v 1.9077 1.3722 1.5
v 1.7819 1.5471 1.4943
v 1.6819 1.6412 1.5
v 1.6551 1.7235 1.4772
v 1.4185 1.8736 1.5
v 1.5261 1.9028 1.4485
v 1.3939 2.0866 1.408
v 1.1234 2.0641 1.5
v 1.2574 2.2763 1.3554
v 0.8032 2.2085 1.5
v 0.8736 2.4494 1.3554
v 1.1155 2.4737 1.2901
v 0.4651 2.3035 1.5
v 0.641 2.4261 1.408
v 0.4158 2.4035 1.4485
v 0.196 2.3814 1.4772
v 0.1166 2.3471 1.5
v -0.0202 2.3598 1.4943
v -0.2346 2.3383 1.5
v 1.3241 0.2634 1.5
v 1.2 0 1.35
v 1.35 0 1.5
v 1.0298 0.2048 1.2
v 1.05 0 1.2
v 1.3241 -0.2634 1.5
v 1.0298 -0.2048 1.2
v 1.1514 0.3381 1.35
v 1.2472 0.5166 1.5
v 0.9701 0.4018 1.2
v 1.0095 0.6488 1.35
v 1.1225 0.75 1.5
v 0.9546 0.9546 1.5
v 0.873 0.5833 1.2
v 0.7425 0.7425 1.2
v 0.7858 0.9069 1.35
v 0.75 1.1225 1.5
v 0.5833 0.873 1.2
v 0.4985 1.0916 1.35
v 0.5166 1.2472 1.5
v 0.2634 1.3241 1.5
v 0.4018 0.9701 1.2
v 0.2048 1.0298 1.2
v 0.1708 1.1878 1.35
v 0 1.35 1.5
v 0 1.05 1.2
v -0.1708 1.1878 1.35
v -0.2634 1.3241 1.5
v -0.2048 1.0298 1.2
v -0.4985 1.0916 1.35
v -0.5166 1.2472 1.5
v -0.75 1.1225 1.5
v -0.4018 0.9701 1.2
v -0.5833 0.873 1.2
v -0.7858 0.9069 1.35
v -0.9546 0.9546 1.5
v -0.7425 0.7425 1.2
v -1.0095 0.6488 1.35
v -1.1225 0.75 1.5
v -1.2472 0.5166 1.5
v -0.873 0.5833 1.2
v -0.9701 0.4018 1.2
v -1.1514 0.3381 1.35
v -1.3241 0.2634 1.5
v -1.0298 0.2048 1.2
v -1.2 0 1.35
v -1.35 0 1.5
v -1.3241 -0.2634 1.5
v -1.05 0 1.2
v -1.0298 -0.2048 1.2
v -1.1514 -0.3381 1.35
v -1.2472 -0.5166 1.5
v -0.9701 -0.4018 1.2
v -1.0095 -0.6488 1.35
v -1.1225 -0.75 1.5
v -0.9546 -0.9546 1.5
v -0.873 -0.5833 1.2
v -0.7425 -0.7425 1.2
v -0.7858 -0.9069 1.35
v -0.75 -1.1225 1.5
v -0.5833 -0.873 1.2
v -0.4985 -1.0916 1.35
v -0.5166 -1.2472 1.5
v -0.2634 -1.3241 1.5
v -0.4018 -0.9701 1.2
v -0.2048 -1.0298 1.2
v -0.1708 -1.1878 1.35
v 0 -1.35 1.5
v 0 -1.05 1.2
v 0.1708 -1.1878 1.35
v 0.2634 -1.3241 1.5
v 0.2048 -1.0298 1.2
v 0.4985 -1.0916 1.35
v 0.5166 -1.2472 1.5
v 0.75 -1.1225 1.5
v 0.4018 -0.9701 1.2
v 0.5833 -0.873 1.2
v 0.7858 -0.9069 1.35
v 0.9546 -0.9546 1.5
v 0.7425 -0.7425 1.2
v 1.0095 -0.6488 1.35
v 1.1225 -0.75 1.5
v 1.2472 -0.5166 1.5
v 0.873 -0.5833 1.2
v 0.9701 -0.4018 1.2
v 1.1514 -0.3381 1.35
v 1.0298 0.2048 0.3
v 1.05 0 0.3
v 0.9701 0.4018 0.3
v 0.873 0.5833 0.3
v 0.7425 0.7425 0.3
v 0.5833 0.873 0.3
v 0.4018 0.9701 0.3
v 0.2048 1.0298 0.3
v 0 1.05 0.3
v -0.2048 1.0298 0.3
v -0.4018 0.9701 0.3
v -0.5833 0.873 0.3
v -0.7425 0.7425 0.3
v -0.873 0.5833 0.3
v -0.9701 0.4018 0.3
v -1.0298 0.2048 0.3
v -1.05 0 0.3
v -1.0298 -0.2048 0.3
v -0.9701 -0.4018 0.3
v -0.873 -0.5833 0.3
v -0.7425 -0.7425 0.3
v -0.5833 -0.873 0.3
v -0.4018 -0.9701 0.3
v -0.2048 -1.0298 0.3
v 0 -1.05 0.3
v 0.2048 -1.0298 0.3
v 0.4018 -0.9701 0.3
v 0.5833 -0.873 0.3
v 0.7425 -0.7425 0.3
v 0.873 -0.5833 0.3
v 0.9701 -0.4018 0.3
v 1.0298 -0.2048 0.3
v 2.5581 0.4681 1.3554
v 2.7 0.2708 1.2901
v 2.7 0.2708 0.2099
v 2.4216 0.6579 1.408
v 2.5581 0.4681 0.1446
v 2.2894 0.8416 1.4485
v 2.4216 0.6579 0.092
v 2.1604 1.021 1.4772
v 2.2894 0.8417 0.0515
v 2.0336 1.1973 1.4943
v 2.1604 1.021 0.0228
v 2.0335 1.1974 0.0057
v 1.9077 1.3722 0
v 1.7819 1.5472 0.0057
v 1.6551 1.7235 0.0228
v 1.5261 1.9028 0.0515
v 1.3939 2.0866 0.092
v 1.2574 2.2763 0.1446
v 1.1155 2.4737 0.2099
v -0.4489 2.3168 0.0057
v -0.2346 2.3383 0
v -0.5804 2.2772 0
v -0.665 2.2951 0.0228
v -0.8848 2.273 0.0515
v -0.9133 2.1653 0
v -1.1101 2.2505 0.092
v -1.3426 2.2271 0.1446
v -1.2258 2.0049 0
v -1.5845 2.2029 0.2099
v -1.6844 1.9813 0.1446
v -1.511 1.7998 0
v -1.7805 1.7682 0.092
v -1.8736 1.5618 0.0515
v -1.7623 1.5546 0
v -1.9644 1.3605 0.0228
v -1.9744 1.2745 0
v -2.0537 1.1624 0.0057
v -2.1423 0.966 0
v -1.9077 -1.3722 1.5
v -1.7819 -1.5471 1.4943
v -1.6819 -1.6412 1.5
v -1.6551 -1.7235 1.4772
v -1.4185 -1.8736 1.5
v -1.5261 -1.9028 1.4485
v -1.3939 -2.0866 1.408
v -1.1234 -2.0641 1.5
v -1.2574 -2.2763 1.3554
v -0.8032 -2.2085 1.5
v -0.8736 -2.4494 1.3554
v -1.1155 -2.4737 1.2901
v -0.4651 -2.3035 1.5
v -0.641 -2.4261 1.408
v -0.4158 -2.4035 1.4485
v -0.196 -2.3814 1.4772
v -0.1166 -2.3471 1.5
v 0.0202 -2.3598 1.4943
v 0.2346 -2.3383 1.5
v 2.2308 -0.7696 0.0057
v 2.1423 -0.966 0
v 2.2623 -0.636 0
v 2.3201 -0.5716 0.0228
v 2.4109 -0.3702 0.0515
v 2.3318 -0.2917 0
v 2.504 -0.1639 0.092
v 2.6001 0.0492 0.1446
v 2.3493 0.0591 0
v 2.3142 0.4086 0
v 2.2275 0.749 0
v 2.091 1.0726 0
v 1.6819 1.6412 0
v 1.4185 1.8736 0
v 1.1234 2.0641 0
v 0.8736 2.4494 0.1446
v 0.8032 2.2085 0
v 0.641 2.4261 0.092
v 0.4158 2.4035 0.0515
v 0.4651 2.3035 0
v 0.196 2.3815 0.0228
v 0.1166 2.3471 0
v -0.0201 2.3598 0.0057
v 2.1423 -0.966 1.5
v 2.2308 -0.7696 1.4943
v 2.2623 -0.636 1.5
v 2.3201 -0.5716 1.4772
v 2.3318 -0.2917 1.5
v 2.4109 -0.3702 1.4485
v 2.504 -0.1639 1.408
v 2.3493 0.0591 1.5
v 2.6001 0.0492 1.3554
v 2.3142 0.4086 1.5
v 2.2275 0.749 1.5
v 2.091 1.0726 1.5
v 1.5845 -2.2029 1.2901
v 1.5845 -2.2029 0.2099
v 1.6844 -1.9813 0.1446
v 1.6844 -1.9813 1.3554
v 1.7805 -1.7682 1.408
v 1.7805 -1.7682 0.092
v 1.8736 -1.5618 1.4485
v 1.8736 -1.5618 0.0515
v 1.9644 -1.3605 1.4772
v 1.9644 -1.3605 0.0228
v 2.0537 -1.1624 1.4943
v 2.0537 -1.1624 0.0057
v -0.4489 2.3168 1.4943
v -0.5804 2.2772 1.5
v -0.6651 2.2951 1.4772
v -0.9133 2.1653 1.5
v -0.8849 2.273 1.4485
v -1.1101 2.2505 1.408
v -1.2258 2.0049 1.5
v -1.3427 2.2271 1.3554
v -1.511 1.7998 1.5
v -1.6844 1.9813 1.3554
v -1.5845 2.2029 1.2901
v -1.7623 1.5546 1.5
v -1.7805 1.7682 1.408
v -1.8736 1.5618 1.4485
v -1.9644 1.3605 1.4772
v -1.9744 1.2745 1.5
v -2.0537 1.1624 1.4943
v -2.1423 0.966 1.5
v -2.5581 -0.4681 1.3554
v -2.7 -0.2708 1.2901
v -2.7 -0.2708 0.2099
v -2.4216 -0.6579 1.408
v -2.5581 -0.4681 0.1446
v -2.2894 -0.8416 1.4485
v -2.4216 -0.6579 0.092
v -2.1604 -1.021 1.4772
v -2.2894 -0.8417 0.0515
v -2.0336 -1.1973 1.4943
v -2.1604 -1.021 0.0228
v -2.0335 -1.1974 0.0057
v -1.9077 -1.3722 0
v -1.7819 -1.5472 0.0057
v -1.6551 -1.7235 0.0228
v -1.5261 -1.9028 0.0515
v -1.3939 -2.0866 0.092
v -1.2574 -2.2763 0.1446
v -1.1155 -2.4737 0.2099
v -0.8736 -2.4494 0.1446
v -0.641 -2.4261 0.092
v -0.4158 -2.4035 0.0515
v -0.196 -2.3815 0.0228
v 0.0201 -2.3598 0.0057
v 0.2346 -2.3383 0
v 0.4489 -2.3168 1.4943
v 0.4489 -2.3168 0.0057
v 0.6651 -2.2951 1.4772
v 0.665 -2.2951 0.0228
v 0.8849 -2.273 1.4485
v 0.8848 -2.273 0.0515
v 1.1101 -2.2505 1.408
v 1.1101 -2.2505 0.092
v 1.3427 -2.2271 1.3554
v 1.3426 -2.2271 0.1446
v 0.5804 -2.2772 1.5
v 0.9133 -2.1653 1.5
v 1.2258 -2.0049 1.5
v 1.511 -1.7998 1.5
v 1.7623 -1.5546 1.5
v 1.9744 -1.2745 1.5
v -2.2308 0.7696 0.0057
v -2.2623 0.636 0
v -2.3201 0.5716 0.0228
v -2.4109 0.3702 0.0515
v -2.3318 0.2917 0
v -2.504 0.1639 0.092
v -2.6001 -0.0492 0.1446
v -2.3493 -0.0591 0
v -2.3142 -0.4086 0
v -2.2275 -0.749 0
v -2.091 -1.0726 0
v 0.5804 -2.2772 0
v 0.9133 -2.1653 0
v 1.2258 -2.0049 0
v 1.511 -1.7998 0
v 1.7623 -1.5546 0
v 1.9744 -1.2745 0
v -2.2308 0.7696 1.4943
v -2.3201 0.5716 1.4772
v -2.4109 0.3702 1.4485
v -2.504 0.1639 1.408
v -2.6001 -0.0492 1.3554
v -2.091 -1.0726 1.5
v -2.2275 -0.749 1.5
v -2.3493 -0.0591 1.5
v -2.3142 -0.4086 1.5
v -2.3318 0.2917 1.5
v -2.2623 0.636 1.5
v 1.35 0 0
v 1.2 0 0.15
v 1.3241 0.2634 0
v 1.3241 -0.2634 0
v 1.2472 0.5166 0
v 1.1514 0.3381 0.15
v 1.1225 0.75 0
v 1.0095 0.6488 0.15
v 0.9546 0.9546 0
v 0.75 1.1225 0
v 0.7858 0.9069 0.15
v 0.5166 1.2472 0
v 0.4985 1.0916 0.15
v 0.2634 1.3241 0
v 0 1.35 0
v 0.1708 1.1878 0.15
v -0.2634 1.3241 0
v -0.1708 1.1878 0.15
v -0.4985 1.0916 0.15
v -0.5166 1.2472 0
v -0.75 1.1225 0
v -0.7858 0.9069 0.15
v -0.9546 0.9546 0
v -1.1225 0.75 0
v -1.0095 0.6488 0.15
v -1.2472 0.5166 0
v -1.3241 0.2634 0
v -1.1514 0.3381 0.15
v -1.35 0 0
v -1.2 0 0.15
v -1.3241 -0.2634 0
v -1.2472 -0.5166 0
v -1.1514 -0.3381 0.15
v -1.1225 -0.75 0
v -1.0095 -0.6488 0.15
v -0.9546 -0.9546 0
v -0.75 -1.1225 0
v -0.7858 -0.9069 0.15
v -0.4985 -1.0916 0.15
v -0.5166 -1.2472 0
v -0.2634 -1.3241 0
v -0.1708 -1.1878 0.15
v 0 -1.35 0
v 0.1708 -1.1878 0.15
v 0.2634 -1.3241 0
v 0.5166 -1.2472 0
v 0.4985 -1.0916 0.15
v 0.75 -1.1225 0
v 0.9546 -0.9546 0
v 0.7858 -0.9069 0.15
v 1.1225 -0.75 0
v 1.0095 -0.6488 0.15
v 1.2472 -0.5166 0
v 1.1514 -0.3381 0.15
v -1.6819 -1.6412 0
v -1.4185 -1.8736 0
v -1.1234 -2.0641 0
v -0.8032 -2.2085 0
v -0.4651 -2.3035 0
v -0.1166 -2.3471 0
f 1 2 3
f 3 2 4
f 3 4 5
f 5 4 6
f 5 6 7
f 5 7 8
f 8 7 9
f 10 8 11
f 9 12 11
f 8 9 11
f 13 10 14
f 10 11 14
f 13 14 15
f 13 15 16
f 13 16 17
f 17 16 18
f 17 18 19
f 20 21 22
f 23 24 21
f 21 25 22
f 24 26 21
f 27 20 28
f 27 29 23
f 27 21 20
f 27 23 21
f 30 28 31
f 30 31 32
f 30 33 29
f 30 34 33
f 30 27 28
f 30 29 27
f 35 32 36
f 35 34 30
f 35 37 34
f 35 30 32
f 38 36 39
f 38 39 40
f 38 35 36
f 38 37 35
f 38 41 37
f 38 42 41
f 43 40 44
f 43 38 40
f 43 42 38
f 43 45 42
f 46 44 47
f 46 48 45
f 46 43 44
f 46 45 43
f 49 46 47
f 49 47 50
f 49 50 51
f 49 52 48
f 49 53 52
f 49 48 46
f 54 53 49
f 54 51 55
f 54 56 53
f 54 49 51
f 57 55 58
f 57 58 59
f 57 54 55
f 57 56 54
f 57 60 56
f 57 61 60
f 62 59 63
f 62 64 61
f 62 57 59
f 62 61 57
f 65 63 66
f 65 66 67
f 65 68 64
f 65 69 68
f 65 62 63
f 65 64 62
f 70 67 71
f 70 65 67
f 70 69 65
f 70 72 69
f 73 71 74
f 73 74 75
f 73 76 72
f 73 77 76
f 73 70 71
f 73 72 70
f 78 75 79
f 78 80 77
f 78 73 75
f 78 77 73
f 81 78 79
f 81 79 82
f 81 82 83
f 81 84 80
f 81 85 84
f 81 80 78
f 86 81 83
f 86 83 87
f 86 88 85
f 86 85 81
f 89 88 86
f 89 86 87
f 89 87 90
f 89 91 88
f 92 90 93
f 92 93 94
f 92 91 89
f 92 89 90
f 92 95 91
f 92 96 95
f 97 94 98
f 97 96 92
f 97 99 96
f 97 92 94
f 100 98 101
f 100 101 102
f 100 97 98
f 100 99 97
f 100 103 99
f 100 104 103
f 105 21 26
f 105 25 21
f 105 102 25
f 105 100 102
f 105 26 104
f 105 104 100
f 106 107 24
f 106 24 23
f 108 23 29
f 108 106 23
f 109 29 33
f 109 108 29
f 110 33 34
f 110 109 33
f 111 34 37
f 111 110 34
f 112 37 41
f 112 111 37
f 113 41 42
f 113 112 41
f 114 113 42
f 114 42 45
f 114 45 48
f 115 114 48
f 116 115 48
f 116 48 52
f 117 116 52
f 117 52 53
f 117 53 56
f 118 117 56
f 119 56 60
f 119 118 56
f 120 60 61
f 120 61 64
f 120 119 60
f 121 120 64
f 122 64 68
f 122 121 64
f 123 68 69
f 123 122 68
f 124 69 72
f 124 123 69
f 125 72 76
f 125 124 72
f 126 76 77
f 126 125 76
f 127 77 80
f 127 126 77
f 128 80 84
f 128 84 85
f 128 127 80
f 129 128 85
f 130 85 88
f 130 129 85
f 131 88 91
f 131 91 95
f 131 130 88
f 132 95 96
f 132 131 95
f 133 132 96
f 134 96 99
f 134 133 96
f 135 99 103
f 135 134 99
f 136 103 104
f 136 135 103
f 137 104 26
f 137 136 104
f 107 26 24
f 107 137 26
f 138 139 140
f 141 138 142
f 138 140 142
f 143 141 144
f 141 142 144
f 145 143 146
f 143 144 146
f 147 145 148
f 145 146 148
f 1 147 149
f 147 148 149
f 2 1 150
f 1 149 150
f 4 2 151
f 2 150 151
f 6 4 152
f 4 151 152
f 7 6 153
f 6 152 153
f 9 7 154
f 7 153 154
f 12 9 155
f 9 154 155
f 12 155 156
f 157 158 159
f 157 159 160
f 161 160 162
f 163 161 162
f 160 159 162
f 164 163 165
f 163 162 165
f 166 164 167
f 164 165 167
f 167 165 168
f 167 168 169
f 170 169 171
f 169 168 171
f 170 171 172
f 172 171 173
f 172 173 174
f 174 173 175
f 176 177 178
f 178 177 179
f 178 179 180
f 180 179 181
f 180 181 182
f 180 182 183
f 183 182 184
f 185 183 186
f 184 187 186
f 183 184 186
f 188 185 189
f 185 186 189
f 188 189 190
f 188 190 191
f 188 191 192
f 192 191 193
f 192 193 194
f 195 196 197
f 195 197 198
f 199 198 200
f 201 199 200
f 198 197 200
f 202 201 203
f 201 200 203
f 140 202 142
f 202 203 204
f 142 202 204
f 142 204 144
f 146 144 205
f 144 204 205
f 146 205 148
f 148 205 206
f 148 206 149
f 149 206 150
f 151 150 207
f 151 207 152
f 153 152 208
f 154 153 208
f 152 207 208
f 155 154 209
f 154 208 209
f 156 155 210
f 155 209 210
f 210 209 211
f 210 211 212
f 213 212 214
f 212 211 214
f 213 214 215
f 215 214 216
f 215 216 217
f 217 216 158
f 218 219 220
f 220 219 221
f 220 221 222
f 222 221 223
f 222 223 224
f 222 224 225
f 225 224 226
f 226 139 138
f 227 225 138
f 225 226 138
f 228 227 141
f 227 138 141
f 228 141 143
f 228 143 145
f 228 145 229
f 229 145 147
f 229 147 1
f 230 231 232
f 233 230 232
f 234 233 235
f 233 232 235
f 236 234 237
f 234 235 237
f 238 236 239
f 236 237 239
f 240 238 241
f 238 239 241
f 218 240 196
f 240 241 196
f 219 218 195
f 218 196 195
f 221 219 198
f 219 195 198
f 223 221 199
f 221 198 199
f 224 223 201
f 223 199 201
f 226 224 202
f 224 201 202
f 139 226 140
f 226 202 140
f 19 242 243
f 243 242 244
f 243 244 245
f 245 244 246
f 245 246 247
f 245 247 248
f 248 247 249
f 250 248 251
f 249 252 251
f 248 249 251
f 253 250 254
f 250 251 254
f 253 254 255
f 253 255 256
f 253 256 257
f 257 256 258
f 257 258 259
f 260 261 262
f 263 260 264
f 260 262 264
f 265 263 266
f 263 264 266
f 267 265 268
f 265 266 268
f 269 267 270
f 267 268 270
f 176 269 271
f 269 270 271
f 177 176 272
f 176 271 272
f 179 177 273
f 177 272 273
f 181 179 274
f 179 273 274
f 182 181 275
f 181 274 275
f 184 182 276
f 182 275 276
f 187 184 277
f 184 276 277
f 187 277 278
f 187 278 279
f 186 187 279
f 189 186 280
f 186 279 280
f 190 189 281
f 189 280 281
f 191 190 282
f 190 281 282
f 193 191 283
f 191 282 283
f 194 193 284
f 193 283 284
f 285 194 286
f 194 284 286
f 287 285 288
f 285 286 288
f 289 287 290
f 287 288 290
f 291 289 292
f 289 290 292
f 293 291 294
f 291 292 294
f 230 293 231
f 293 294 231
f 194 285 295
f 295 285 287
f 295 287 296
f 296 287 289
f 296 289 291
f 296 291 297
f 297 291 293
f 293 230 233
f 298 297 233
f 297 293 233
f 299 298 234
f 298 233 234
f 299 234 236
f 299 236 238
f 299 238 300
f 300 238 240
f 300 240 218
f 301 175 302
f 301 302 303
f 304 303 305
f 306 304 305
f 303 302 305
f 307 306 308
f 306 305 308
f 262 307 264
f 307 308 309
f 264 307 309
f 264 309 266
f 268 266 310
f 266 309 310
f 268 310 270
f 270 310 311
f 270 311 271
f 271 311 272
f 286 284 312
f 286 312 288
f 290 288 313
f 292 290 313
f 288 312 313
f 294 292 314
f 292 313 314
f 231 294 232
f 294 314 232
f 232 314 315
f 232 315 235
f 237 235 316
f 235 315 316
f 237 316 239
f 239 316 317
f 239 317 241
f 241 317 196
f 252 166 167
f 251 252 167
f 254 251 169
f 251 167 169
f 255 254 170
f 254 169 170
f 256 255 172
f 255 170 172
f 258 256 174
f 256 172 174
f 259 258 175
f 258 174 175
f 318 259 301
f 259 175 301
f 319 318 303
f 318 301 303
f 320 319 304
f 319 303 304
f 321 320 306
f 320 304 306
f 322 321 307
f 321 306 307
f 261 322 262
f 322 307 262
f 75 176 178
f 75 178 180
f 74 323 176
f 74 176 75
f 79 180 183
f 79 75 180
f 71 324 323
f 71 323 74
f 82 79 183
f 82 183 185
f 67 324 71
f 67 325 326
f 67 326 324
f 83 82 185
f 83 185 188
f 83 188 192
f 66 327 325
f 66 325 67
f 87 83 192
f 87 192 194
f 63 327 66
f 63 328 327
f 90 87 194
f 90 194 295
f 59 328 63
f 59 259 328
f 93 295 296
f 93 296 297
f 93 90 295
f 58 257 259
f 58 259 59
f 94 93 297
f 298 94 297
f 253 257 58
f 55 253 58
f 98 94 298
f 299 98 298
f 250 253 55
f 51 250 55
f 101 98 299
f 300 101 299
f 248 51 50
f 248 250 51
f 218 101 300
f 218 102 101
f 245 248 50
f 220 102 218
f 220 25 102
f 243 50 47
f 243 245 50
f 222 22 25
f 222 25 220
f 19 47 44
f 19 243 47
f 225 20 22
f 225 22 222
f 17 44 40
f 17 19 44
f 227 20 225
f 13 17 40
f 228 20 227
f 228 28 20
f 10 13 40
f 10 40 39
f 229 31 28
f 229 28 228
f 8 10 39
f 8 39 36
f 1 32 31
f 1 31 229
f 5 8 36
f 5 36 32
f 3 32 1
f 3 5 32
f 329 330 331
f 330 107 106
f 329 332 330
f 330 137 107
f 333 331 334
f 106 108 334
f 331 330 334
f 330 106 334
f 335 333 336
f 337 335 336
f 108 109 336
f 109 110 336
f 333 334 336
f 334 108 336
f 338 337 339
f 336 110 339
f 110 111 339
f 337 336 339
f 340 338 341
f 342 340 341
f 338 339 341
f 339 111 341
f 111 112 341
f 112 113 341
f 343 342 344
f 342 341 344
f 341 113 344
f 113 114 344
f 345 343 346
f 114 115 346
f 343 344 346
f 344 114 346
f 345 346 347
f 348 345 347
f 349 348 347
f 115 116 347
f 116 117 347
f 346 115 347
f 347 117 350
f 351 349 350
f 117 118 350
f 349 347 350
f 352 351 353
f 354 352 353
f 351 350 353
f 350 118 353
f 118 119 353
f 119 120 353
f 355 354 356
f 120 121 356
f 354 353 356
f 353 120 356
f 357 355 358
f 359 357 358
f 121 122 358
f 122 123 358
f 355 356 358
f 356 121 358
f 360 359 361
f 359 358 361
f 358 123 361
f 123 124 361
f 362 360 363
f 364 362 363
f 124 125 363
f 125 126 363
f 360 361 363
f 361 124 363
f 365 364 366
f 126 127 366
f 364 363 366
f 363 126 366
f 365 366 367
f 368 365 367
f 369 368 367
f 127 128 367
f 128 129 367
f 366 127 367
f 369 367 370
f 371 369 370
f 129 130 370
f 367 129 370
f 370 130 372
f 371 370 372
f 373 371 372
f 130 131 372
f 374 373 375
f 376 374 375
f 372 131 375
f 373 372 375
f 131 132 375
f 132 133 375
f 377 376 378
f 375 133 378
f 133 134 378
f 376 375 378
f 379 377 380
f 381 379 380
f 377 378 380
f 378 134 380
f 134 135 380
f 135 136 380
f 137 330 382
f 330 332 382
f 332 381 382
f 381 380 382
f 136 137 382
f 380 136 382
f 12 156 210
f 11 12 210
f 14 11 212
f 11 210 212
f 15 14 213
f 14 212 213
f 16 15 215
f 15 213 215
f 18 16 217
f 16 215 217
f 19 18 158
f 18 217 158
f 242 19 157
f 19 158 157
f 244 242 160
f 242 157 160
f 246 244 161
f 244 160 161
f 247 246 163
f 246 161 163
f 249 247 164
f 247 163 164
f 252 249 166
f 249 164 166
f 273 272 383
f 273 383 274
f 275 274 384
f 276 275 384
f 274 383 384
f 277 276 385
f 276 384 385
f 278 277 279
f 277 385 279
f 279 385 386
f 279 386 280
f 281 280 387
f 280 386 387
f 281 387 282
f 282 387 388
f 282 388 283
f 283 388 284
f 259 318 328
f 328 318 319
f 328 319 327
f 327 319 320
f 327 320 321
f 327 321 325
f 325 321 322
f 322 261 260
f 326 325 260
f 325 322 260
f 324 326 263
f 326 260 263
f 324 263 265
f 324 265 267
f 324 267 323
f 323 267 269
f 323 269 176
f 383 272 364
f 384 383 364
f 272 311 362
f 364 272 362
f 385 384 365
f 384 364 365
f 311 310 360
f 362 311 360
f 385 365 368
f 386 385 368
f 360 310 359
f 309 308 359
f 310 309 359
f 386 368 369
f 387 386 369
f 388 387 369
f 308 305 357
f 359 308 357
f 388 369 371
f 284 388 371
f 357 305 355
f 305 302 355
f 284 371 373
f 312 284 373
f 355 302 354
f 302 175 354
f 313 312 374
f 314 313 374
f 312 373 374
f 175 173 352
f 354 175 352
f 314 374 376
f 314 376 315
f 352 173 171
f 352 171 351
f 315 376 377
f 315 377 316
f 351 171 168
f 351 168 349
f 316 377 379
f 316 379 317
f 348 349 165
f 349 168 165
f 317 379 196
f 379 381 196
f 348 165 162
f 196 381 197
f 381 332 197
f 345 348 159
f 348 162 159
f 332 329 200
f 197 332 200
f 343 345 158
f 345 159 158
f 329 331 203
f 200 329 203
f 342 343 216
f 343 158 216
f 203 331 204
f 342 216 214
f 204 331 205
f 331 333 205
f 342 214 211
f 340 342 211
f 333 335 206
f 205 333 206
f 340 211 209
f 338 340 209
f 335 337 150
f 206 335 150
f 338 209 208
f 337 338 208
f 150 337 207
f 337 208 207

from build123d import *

# Parameters (mm, degrees)
SKICA1_R                = 1.05
P_IDAT_VYSUNUT_M1_DEPTH = 1.5
ZKOSEN_1_SIZE           = 0.3


with BuildPart() as part:
    # Skica1 → Přidat vysunutím1 (new body)
    with BuildSketch(Plane.XY):
        Polygon((1.115479212, 2.47366923), (-1.584520788, 2.20286795), (-2.7, -0.27080128), (-1.115479212, -2.47366923), (1.584520788, -2.20286795), (2.7, 0.27080128), align=None)
        Circle(SKICA1_R, mode=Mode.SUBTRACT)
    extrude(amount=P_IDAT_VYSUNUT_M1_DEPTH)

    # Skica2 → Odebrat rotací1 (revolve, cut)
    with BuildSketch(Plane(origin=(0, 0, 0), x_dir=(0.911600167657697, -0.41107801489067575, 0), z_dir=(0.41107801489067575, 0.911600167657697, 0))):
        Polygon((-3.649038106, -1.5), (-2.35, -1.5), (-3.649038106, -0.75), align=None)
        Polygon((-3.649038106, -0.75), (-2.35, 0), (-3.649038106, 0), align=None)
    revolve(axis=Axis((0, 0, 0.75), (0, 0, 1)), mode=Mode.SUBTRACT)

    # Zkosení1
    zkosen_1_edges = [part.edges().sort_by_distance(p)[0] for p in [
        (-1.05, 0, 0),
        (-1.05, 0, 1.5),
    ]]
    chamfer(zkosen_1_edges, length=ZKOSEN_1_SIZE)


solid = part.part
